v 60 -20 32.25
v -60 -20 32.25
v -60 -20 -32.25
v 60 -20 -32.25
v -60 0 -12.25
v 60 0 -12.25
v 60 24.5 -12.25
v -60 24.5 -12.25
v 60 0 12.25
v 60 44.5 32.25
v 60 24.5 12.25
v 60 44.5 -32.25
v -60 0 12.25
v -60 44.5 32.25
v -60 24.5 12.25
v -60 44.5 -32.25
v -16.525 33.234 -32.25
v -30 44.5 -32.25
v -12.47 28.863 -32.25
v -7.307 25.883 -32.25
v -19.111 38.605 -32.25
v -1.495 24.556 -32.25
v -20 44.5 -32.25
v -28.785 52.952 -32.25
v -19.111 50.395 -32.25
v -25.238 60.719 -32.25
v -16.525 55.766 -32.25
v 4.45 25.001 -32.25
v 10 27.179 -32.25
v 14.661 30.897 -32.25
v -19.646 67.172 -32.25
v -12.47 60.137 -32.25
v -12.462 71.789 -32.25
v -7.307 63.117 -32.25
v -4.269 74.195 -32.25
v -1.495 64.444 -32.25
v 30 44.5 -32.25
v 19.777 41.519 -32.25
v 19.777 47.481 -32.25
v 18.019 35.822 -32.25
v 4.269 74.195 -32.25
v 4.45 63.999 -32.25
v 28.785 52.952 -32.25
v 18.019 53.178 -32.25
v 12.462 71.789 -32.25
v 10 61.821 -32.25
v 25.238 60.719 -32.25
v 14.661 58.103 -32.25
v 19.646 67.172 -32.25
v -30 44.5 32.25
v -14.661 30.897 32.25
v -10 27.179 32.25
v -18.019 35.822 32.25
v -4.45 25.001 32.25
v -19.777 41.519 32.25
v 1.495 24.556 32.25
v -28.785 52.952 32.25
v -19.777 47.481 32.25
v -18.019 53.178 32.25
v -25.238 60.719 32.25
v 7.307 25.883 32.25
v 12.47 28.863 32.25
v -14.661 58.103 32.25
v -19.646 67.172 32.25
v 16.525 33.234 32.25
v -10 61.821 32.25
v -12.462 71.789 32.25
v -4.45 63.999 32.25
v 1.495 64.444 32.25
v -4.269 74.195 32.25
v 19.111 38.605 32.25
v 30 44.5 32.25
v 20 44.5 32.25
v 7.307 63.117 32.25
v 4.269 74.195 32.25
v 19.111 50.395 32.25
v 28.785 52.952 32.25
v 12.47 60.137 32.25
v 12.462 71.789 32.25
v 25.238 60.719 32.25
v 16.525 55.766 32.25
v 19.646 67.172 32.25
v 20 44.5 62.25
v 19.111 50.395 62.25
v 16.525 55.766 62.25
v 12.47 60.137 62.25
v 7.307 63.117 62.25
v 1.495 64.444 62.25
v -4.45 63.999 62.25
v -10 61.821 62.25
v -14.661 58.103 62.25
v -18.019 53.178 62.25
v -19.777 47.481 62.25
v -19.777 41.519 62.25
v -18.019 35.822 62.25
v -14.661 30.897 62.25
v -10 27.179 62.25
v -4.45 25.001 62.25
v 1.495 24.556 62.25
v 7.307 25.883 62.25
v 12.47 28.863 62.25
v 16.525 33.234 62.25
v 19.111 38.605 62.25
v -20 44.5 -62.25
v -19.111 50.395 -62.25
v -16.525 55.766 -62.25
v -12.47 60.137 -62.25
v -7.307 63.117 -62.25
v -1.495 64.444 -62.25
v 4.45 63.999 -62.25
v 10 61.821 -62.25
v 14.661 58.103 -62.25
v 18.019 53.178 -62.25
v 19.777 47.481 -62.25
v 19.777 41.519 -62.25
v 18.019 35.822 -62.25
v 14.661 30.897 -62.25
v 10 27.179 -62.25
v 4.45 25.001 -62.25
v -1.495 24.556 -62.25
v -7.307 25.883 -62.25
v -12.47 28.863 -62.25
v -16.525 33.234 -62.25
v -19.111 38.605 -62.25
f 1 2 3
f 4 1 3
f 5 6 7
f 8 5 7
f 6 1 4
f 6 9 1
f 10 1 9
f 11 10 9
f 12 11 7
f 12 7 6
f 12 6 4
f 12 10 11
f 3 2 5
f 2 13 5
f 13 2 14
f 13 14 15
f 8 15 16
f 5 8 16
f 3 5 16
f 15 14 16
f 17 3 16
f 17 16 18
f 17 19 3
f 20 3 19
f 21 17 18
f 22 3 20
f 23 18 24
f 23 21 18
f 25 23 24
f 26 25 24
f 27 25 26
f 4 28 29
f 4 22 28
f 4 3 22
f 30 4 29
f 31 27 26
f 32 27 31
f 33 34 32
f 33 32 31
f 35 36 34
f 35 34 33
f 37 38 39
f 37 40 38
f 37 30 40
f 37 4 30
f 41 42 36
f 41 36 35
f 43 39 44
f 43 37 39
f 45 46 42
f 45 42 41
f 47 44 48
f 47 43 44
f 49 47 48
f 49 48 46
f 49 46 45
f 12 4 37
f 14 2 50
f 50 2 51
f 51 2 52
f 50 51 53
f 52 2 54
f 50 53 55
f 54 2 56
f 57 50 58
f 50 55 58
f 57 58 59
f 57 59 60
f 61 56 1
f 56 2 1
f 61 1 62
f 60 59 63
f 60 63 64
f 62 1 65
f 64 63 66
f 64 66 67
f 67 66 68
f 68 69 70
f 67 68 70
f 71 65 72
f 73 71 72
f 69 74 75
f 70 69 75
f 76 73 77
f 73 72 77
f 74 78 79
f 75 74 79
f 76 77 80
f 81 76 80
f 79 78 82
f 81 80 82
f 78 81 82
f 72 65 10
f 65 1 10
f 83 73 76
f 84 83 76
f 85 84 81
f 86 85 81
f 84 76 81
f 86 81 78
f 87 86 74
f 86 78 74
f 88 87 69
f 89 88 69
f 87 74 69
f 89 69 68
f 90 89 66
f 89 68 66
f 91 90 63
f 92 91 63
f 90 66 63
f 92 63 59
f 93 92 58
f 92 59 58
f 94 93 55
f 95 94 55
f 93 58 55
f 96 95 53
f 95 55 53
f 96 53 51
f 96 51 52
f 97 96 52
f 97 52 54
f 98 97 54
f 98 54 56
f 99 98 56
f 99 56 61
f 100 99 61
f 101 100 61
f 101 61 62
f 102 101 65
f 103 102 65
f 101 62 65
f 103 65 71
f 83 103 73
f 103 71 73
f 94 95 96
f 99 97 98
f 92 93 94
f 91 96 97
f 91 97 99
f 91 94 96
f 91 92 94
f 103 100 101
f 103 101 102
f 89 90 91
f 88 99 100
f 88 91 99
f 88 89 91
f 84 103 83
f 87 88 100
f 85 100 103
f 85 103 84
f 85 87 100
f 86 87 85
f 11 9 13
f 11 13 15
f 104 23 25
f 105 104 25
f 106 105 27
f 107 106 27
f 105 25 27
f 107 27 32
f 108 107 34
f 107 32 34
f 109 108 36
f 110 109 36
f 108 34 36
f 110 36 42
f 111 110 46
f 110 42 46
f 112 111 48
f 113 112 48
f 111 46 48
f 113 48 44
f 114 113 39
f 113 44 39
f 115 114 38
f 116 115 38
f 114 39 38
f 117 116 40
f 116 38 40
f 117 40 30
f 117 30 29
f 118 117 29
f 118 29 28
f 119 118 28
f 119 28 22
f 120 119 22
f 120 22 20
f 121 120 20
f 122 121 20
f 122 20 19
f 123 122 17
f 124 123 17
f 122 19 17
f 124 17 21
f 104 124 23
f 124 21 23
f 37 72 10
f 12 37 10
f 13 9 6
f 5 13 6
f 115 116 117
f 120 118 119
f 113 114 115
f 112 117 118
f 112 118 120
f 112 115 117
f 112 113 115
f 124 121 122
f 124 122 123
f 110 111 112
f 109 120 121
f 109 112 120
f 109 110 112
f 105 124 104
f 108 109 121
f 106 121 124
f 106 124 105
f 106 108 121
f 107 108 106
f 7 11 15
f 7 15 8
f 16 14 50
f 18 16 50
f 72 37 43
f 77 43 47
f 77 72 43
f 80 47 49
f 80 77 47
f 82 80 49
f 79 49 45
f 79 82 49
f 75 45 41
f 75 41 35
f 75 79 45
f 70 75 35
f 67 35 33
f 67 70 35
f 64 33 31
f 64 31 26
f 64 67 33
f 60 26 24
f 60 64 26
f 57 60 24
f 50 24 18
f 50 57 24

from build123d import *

# Parameters (mm, degrees)
SKETCH_1_W          = 120
SKETCH_1_H          = 64.5
EXTRUDE_1_DEPTH     = 44.5
SKETCH_2_W          = 24.5
SKETCH_2_H          = 24.5
CUT_EXTRUDE_1_DEPTH = 121
EXTRUDE_2_DEPTH     = 64.5
SKETCH_4_R          = 20
EXTRUDE_3_DEPTH     = 30
SKETCH_5_R          = 20
EXTRUDE_4_DEPTH     = 30
SKETCH_6_W          = 64.5
SKETCH_6_H          = 20
EXTRUDE_5_DEPTH     = 120


with BuildPart() as part:
    # 草图1 → 凸台-拉伸1 (new body)
    with BuildSketch(Plane(origin=(0, 0, 0), x_dir=(1, 0, 0), z_dir=(0, 1, 0))):
        Rectangle(SKETCH_1_W, SKETCH_1_H)
    extrude(amount=EXTRUDE_1_DEPTH)

    # 草图2 → 切除-拉伸1 (cut, through all)
    with BuildSketch(Plane(origin=(60, 0, 0), x_dir=(0, 0, -1), z_dir=(1, 0, 0))):
        with Locations((0, 12.25)):
            Rectangle(SKETCH_2_W, SKETCH_2_H)
    extrude(amount=-CUT_EXTRUDE_1_DEPTH, mode=Mode.SUBTRACT)

    # 草图3 → 凸台-拉伸2 (add)
    with BuildSketch(Plane.XY.offset(32.25)):
        with BuildLine():
            Line((-30, 44.5), (30, 44.5))
            ThreePointArc((30, 44.5), (0, 74.5), (-30, 44.5))
        make_face()
    extrude(amount=-EXTRUDE_2_DEPTH)

    # 草图4 → 凸台-拉伸3 (add)
    with BuildSketch(Plane.XY.offset(32.25)):
        with Locations((0, 44.5)):
            Circle(SKETCH_4_R)
    extrude(amount=EXTRUDE_3_DEPTH)

    # 草图5 → 凸台-拉伸4 (add)
    with BuildSketch(Plane(origin=(0, 0, -32.25), x_dir=(-1, 0, 0), z_dir=(0, 0, -1))):
        with Locations((0, 44.5)):
            Circle(SKETCH_5_R)
    extrude(amount=EXTRUDE_4_DEPTH)

    # 草图6 → 凸台-拉伸5 (add)
    with BuildSketch(Plane(origin=(60, 0, 0), x_dir=(0, 0, -1), z_dir=(1, 0, 0))):
        with Locations((0, -10)):
            Rectangle(SKETCH_6_W, SKETCH_6_H)
    extrude(amount=-EXTRUDE_5_DEPTH)


solid = part.part
